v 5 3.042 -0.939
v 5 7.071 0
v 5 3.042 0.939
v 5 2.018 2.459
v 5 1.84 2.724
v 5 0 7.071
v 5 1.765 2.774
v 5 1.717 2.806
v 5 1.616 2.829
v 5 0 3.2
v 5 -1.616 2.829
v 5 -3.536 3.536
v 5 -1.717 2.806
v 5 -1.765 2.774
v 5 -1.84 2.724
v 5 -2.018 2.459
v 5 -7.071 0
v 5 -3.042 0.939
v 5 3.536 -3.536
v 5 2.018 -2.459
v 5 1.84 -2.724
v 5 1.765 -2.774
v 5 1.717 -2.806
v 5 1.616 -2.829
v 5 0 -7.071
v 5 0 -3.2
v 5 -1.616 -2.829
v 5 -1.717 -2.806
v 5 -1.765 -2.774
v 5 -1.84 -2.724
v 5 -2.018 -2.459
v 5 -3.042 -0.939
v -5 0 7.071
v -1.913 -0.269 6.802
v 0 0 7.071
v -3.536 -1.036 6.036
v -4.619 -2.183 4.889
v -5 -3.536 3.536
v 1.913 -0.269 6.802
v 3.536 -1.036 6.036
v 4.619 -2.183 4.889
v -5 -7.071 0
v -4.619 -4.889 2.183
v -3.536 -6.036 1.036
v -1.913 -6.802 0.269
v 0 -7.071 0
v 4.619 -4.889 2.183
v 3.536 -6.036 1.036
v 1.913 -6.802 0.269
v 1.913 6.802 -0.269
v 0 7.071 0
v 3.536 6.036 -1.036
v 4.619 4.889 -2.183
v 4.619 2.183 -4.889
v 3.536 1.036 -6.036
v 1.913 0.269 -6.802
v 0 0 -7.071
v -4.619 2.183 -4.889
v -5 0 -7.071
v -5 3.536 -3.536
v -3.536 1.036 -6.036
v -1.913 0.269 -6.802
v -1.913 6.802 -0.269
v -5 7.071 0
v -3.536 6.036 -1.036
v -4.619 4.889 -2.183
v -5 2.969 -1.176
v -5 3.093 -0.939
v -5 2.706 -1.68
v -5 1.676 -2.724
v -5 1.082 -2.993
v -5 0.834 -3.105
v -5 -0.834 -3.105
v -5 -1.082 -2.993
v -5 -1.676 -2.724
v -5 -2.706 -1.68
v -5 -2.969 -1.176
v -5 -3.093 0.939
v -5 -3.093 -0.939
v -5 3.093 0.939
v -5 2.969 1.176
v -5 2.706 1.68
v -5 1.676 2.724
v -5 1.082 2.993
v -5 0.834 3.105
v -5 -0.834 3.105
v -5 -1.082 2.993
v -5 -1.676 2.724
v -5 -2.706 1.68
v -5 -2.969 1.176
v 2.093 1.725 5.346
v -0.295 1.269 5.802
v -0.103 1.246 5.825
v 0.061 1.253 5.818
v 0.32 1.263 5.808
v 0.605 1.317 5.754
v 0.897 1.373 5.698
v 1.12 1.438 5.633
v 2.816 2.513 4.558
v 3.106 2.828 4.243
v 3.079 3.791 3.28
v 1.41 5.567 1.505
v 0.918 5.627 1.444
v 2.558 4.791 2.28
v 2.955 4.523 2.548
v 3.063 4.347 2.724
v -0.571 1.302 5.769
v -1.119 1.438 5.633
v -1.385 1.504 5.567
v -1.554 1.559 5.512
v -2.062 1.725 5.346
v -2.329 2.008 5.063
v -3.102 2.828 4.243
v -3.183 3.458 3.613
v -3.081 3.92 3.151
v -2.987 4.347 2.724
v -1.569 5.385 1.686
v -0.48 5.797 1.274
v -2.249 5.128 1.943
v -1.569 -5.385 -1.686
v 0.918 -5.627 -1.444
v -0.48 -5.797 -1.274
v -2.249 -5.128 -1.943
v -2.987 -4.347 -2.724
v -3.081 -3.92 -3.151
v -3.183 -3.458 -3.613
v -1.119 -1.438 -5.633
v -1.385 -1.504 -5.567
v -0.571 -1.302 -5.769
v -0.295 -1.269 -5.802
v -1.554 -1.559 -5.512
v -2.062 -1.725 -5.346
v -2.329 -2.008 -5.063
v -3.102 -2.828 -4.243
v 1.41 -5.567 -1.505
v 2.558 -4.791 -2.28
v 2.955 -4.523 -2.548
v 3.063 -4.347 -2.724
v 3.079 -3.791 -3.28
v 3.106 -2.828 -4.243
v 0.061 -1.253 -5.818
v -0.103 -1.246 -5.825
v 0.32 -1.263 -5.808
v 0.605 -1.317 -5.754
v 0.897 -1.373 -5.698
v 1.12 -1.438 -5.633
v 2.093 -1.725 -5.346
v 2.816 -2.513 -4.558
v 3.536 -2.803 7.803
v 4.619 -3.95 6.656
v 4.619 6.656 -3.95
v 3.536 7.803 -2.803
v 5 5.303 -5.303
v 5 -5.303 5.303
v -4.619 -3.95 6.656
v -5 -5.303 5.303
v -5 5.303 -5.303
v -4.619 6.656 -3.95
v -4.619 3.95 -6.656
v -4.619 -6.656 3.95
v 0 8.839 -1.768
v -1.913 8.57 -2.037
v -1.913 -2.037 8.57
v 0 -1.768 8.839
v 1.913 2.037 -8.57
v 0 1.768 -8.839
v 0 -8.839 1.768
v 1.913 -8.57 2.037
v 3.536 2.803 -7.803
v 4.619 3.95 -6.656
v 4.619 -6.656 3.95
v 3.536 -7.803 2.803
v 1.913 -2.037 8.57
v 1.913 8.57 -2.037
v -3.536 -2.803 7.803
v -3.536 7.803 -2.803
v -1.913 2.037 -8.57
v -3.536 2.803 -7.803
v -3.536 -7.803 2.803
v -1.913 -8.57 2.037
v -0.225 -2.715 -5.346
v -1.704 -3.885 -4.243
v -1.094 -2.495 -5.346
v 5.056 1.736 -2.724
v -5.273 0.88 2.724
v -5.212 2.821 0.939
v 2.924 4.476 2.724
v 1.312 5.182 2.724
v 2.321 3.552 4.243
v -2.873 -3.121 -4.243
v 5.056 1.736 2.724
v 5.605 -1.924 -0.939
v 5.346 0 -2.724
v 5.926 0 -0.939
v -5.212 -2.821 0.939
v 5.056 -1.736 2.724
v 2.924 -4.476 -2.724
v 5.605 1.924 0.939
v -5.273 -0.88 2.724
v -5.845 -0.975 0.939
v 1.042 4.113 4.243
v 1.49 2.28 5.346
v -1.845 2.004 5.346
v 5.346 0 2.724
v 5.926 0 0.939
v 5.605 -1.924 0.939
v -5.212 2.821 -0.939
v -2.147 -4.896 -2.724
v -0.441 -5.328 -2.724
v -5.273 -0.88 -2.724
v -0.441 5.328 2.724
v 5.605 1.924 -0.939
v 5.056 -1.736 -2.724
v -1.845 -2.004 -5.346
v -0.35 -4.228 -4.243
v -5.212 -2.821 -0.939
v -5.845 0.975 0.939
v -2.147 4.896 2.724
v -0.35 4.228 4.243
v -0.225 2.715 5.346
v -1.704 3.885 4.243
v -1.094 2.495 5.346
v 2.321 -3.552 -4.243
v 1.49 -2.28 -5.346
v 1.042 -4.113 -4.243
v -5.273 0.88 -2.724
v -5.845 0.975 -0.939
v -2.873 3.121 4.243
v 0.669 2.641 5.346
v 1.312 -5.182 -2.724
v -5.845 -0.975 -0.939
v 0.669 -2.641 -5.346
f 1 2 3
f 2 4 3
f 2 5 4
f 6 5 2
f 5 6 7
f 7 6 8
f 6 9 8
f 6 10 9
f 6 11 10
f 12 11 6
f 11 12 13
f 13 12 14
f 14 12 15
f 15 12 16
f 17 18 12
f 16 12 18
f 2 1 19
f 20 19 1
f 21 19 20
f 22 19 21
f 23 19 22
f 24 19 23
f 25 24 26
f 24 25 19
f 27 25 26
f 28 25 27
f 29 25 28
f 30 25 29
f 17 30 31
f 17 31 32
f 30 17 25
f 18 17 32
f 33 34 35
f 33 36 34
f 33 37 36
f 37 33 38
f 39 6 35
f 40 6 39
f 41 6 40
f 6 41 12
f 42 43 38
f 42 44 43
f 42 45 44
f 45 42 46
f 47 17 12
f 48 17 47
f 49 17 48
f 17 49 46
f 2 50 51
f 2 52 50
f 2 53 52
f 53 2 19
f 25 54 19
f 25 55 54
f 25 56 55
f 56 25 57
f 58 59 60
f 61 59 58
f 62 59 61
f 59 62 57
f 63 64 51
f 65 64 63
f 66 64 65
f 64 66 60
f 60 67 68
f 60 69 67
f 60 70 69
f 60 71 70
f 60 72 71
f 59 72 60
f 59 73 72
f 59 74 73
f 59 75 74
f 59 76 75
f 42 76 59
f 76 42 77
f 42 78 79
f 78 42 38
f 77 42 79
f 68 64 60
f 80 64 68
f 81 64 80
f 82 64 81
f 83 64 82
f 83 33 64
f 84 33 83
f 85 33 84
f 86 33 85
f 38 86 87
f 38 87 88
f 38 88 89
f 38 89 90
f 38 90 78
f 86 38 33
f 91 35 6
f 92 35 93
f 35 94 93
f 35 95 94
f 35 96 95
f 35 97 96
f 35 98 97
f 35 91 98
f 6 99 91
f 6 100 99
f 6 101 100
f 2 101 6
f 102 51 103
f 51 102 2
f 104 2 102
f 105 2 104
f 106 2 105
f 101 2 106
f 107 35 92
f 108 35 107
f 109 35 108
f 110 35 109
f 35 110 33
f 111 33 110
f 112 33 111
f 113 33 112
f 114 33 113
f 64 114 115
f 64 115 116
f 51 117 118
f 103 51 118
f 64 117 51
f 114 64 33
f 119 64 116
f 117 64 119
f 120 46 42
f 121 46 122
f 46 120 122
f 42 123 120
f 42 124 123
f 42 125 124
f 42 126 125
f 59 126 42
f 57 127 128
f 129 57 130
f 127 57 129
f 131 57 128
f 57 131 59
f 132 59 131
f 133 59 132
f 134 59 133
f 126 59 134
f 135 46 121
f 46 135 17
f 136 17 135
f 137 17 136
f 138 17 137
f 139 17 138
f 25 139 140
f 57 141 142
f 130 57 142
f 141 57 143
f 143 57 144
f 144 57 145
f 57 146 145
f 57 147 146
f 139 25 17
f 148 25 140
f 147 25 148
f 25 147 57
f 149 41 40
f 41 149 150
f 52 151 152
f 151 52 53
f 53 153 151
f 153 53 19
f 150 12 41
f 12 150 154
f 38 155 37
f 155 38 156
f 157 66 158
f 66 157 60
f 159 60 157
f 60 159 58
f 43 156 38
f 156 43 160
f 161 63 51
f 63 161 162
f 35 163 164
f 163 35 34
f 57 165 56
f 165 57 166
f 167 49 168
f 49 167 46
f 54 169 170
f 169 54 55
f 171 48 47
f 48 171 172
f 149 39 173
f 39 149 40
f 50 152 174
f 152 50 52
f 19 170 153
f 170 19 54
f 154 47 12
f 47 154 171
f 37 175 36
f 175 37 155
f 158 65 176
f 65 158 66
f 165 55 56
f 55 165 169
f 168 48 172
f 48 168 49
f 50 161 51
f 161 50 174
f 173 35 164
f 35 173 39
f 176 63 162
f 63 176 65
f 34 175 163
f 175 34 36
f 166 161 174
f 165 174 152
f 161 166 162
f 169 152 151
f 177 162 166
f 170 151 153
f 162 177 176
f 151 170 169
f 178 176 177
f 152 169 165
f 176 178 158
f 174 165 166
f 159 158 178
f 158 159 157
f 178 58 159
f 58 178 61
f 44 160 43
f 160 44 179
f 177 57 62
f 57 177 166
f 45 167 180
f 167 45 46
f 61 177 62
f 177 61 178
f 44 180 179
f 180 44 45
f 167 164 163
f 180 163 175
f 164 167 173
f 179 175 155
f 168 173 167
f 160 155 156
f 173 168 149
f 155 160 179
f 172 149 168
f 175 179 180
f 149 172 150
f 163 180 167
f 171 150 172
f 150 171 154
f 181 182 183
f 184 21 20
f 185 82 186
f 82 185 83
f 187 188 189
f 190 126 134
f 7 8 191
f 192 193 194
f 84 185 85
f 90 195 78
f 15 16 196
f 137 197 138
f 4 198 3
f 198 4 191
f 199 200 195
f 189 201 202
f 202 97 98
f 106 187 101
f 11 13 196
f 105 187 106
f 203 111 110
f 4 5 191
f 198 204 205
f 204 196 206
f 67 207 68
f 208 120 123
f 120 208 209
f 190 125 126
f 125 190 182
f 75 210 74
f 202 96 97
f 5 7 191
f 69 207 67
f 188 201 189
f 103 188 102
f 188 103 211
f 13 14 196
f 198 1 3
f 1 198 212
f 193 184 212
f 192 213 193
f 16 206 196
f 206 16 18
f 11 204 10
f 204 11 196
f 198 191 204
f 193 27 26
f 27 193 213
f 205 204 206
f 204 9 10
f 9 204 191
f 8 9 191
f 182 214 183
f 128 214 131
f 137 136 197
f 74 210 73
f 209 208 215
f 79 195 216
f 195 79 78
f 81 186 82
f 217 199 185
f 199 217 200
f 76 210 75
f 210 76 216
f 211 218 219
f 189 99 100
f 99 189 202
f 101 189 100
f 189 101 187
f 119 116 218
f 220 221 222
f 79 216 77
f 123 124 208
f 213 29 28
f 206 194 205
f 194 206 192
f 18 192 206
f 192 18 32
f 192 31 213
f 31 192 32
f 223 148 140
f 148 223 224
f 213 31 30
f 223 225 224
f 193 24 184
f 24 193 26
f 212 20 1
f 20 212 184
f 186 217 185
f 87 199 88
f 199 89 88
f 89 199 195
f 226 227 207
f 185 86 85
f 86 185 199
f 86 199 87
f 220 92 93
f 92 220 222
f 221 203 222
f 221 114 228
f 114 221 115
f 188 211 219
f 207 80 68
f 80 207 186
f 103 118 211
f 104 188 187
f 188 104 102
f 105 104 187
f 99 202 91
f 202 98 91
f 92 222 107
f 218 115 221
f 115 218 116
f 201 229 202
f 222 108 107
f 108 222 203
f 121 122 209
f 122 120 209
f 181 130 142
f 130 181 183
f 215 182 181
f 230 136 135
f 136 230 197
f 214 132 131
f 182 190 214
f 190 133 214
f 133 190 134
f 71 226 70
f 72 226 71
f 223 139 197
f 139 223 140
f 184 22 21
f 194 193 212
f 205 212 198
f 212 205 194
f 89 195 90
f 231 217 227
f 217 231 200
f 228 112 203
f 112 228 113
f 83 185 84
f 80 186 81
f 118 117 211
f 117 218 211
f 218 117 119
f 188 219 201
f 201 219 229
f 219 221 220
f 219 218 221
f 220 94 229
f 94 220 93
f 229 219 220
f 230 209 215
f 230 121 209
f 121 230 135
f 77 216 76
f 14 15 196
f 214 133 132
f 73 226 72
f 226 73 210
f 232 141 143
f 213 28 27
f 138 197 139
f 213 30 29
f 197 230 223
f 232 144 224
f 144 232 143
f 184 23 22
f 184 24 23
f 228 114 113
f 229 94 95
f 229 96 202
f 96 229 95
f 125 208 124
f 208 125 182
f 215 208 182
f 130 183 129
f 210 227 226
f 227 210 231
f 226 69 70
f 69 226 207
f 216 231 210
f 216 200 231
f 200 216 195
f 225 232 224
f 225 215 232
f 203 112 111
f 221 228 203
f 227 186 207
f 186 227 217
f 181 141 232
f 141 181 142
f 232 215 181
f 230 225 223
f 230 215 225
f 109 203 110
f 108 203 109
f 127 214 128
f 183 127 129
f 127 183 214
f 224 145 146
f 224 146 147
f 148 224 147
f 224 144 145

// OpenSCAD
// Size of the Cube (all directions)
cuSize = 10;

// The diameter of the Cylinder
cyDia = 10;

// The height of the Cylinder
cyHei = 15;

// The radius of the Sphere
sphereRadius = 6;

// X-Rotation of the Cylinder and Cube
rX = 45;

// Create Sphere and rotate Cube and Cylinder by 'rX'
// You need to use {} around the shapes to rotate
sphere(r = sphereRadius);
rotate([rX, 0, 0]){
    cube(size = [cuSize, cuSize, cuSize], center = true);
    cylinder(d = cyDia, h = cyHei, center = true);
}
